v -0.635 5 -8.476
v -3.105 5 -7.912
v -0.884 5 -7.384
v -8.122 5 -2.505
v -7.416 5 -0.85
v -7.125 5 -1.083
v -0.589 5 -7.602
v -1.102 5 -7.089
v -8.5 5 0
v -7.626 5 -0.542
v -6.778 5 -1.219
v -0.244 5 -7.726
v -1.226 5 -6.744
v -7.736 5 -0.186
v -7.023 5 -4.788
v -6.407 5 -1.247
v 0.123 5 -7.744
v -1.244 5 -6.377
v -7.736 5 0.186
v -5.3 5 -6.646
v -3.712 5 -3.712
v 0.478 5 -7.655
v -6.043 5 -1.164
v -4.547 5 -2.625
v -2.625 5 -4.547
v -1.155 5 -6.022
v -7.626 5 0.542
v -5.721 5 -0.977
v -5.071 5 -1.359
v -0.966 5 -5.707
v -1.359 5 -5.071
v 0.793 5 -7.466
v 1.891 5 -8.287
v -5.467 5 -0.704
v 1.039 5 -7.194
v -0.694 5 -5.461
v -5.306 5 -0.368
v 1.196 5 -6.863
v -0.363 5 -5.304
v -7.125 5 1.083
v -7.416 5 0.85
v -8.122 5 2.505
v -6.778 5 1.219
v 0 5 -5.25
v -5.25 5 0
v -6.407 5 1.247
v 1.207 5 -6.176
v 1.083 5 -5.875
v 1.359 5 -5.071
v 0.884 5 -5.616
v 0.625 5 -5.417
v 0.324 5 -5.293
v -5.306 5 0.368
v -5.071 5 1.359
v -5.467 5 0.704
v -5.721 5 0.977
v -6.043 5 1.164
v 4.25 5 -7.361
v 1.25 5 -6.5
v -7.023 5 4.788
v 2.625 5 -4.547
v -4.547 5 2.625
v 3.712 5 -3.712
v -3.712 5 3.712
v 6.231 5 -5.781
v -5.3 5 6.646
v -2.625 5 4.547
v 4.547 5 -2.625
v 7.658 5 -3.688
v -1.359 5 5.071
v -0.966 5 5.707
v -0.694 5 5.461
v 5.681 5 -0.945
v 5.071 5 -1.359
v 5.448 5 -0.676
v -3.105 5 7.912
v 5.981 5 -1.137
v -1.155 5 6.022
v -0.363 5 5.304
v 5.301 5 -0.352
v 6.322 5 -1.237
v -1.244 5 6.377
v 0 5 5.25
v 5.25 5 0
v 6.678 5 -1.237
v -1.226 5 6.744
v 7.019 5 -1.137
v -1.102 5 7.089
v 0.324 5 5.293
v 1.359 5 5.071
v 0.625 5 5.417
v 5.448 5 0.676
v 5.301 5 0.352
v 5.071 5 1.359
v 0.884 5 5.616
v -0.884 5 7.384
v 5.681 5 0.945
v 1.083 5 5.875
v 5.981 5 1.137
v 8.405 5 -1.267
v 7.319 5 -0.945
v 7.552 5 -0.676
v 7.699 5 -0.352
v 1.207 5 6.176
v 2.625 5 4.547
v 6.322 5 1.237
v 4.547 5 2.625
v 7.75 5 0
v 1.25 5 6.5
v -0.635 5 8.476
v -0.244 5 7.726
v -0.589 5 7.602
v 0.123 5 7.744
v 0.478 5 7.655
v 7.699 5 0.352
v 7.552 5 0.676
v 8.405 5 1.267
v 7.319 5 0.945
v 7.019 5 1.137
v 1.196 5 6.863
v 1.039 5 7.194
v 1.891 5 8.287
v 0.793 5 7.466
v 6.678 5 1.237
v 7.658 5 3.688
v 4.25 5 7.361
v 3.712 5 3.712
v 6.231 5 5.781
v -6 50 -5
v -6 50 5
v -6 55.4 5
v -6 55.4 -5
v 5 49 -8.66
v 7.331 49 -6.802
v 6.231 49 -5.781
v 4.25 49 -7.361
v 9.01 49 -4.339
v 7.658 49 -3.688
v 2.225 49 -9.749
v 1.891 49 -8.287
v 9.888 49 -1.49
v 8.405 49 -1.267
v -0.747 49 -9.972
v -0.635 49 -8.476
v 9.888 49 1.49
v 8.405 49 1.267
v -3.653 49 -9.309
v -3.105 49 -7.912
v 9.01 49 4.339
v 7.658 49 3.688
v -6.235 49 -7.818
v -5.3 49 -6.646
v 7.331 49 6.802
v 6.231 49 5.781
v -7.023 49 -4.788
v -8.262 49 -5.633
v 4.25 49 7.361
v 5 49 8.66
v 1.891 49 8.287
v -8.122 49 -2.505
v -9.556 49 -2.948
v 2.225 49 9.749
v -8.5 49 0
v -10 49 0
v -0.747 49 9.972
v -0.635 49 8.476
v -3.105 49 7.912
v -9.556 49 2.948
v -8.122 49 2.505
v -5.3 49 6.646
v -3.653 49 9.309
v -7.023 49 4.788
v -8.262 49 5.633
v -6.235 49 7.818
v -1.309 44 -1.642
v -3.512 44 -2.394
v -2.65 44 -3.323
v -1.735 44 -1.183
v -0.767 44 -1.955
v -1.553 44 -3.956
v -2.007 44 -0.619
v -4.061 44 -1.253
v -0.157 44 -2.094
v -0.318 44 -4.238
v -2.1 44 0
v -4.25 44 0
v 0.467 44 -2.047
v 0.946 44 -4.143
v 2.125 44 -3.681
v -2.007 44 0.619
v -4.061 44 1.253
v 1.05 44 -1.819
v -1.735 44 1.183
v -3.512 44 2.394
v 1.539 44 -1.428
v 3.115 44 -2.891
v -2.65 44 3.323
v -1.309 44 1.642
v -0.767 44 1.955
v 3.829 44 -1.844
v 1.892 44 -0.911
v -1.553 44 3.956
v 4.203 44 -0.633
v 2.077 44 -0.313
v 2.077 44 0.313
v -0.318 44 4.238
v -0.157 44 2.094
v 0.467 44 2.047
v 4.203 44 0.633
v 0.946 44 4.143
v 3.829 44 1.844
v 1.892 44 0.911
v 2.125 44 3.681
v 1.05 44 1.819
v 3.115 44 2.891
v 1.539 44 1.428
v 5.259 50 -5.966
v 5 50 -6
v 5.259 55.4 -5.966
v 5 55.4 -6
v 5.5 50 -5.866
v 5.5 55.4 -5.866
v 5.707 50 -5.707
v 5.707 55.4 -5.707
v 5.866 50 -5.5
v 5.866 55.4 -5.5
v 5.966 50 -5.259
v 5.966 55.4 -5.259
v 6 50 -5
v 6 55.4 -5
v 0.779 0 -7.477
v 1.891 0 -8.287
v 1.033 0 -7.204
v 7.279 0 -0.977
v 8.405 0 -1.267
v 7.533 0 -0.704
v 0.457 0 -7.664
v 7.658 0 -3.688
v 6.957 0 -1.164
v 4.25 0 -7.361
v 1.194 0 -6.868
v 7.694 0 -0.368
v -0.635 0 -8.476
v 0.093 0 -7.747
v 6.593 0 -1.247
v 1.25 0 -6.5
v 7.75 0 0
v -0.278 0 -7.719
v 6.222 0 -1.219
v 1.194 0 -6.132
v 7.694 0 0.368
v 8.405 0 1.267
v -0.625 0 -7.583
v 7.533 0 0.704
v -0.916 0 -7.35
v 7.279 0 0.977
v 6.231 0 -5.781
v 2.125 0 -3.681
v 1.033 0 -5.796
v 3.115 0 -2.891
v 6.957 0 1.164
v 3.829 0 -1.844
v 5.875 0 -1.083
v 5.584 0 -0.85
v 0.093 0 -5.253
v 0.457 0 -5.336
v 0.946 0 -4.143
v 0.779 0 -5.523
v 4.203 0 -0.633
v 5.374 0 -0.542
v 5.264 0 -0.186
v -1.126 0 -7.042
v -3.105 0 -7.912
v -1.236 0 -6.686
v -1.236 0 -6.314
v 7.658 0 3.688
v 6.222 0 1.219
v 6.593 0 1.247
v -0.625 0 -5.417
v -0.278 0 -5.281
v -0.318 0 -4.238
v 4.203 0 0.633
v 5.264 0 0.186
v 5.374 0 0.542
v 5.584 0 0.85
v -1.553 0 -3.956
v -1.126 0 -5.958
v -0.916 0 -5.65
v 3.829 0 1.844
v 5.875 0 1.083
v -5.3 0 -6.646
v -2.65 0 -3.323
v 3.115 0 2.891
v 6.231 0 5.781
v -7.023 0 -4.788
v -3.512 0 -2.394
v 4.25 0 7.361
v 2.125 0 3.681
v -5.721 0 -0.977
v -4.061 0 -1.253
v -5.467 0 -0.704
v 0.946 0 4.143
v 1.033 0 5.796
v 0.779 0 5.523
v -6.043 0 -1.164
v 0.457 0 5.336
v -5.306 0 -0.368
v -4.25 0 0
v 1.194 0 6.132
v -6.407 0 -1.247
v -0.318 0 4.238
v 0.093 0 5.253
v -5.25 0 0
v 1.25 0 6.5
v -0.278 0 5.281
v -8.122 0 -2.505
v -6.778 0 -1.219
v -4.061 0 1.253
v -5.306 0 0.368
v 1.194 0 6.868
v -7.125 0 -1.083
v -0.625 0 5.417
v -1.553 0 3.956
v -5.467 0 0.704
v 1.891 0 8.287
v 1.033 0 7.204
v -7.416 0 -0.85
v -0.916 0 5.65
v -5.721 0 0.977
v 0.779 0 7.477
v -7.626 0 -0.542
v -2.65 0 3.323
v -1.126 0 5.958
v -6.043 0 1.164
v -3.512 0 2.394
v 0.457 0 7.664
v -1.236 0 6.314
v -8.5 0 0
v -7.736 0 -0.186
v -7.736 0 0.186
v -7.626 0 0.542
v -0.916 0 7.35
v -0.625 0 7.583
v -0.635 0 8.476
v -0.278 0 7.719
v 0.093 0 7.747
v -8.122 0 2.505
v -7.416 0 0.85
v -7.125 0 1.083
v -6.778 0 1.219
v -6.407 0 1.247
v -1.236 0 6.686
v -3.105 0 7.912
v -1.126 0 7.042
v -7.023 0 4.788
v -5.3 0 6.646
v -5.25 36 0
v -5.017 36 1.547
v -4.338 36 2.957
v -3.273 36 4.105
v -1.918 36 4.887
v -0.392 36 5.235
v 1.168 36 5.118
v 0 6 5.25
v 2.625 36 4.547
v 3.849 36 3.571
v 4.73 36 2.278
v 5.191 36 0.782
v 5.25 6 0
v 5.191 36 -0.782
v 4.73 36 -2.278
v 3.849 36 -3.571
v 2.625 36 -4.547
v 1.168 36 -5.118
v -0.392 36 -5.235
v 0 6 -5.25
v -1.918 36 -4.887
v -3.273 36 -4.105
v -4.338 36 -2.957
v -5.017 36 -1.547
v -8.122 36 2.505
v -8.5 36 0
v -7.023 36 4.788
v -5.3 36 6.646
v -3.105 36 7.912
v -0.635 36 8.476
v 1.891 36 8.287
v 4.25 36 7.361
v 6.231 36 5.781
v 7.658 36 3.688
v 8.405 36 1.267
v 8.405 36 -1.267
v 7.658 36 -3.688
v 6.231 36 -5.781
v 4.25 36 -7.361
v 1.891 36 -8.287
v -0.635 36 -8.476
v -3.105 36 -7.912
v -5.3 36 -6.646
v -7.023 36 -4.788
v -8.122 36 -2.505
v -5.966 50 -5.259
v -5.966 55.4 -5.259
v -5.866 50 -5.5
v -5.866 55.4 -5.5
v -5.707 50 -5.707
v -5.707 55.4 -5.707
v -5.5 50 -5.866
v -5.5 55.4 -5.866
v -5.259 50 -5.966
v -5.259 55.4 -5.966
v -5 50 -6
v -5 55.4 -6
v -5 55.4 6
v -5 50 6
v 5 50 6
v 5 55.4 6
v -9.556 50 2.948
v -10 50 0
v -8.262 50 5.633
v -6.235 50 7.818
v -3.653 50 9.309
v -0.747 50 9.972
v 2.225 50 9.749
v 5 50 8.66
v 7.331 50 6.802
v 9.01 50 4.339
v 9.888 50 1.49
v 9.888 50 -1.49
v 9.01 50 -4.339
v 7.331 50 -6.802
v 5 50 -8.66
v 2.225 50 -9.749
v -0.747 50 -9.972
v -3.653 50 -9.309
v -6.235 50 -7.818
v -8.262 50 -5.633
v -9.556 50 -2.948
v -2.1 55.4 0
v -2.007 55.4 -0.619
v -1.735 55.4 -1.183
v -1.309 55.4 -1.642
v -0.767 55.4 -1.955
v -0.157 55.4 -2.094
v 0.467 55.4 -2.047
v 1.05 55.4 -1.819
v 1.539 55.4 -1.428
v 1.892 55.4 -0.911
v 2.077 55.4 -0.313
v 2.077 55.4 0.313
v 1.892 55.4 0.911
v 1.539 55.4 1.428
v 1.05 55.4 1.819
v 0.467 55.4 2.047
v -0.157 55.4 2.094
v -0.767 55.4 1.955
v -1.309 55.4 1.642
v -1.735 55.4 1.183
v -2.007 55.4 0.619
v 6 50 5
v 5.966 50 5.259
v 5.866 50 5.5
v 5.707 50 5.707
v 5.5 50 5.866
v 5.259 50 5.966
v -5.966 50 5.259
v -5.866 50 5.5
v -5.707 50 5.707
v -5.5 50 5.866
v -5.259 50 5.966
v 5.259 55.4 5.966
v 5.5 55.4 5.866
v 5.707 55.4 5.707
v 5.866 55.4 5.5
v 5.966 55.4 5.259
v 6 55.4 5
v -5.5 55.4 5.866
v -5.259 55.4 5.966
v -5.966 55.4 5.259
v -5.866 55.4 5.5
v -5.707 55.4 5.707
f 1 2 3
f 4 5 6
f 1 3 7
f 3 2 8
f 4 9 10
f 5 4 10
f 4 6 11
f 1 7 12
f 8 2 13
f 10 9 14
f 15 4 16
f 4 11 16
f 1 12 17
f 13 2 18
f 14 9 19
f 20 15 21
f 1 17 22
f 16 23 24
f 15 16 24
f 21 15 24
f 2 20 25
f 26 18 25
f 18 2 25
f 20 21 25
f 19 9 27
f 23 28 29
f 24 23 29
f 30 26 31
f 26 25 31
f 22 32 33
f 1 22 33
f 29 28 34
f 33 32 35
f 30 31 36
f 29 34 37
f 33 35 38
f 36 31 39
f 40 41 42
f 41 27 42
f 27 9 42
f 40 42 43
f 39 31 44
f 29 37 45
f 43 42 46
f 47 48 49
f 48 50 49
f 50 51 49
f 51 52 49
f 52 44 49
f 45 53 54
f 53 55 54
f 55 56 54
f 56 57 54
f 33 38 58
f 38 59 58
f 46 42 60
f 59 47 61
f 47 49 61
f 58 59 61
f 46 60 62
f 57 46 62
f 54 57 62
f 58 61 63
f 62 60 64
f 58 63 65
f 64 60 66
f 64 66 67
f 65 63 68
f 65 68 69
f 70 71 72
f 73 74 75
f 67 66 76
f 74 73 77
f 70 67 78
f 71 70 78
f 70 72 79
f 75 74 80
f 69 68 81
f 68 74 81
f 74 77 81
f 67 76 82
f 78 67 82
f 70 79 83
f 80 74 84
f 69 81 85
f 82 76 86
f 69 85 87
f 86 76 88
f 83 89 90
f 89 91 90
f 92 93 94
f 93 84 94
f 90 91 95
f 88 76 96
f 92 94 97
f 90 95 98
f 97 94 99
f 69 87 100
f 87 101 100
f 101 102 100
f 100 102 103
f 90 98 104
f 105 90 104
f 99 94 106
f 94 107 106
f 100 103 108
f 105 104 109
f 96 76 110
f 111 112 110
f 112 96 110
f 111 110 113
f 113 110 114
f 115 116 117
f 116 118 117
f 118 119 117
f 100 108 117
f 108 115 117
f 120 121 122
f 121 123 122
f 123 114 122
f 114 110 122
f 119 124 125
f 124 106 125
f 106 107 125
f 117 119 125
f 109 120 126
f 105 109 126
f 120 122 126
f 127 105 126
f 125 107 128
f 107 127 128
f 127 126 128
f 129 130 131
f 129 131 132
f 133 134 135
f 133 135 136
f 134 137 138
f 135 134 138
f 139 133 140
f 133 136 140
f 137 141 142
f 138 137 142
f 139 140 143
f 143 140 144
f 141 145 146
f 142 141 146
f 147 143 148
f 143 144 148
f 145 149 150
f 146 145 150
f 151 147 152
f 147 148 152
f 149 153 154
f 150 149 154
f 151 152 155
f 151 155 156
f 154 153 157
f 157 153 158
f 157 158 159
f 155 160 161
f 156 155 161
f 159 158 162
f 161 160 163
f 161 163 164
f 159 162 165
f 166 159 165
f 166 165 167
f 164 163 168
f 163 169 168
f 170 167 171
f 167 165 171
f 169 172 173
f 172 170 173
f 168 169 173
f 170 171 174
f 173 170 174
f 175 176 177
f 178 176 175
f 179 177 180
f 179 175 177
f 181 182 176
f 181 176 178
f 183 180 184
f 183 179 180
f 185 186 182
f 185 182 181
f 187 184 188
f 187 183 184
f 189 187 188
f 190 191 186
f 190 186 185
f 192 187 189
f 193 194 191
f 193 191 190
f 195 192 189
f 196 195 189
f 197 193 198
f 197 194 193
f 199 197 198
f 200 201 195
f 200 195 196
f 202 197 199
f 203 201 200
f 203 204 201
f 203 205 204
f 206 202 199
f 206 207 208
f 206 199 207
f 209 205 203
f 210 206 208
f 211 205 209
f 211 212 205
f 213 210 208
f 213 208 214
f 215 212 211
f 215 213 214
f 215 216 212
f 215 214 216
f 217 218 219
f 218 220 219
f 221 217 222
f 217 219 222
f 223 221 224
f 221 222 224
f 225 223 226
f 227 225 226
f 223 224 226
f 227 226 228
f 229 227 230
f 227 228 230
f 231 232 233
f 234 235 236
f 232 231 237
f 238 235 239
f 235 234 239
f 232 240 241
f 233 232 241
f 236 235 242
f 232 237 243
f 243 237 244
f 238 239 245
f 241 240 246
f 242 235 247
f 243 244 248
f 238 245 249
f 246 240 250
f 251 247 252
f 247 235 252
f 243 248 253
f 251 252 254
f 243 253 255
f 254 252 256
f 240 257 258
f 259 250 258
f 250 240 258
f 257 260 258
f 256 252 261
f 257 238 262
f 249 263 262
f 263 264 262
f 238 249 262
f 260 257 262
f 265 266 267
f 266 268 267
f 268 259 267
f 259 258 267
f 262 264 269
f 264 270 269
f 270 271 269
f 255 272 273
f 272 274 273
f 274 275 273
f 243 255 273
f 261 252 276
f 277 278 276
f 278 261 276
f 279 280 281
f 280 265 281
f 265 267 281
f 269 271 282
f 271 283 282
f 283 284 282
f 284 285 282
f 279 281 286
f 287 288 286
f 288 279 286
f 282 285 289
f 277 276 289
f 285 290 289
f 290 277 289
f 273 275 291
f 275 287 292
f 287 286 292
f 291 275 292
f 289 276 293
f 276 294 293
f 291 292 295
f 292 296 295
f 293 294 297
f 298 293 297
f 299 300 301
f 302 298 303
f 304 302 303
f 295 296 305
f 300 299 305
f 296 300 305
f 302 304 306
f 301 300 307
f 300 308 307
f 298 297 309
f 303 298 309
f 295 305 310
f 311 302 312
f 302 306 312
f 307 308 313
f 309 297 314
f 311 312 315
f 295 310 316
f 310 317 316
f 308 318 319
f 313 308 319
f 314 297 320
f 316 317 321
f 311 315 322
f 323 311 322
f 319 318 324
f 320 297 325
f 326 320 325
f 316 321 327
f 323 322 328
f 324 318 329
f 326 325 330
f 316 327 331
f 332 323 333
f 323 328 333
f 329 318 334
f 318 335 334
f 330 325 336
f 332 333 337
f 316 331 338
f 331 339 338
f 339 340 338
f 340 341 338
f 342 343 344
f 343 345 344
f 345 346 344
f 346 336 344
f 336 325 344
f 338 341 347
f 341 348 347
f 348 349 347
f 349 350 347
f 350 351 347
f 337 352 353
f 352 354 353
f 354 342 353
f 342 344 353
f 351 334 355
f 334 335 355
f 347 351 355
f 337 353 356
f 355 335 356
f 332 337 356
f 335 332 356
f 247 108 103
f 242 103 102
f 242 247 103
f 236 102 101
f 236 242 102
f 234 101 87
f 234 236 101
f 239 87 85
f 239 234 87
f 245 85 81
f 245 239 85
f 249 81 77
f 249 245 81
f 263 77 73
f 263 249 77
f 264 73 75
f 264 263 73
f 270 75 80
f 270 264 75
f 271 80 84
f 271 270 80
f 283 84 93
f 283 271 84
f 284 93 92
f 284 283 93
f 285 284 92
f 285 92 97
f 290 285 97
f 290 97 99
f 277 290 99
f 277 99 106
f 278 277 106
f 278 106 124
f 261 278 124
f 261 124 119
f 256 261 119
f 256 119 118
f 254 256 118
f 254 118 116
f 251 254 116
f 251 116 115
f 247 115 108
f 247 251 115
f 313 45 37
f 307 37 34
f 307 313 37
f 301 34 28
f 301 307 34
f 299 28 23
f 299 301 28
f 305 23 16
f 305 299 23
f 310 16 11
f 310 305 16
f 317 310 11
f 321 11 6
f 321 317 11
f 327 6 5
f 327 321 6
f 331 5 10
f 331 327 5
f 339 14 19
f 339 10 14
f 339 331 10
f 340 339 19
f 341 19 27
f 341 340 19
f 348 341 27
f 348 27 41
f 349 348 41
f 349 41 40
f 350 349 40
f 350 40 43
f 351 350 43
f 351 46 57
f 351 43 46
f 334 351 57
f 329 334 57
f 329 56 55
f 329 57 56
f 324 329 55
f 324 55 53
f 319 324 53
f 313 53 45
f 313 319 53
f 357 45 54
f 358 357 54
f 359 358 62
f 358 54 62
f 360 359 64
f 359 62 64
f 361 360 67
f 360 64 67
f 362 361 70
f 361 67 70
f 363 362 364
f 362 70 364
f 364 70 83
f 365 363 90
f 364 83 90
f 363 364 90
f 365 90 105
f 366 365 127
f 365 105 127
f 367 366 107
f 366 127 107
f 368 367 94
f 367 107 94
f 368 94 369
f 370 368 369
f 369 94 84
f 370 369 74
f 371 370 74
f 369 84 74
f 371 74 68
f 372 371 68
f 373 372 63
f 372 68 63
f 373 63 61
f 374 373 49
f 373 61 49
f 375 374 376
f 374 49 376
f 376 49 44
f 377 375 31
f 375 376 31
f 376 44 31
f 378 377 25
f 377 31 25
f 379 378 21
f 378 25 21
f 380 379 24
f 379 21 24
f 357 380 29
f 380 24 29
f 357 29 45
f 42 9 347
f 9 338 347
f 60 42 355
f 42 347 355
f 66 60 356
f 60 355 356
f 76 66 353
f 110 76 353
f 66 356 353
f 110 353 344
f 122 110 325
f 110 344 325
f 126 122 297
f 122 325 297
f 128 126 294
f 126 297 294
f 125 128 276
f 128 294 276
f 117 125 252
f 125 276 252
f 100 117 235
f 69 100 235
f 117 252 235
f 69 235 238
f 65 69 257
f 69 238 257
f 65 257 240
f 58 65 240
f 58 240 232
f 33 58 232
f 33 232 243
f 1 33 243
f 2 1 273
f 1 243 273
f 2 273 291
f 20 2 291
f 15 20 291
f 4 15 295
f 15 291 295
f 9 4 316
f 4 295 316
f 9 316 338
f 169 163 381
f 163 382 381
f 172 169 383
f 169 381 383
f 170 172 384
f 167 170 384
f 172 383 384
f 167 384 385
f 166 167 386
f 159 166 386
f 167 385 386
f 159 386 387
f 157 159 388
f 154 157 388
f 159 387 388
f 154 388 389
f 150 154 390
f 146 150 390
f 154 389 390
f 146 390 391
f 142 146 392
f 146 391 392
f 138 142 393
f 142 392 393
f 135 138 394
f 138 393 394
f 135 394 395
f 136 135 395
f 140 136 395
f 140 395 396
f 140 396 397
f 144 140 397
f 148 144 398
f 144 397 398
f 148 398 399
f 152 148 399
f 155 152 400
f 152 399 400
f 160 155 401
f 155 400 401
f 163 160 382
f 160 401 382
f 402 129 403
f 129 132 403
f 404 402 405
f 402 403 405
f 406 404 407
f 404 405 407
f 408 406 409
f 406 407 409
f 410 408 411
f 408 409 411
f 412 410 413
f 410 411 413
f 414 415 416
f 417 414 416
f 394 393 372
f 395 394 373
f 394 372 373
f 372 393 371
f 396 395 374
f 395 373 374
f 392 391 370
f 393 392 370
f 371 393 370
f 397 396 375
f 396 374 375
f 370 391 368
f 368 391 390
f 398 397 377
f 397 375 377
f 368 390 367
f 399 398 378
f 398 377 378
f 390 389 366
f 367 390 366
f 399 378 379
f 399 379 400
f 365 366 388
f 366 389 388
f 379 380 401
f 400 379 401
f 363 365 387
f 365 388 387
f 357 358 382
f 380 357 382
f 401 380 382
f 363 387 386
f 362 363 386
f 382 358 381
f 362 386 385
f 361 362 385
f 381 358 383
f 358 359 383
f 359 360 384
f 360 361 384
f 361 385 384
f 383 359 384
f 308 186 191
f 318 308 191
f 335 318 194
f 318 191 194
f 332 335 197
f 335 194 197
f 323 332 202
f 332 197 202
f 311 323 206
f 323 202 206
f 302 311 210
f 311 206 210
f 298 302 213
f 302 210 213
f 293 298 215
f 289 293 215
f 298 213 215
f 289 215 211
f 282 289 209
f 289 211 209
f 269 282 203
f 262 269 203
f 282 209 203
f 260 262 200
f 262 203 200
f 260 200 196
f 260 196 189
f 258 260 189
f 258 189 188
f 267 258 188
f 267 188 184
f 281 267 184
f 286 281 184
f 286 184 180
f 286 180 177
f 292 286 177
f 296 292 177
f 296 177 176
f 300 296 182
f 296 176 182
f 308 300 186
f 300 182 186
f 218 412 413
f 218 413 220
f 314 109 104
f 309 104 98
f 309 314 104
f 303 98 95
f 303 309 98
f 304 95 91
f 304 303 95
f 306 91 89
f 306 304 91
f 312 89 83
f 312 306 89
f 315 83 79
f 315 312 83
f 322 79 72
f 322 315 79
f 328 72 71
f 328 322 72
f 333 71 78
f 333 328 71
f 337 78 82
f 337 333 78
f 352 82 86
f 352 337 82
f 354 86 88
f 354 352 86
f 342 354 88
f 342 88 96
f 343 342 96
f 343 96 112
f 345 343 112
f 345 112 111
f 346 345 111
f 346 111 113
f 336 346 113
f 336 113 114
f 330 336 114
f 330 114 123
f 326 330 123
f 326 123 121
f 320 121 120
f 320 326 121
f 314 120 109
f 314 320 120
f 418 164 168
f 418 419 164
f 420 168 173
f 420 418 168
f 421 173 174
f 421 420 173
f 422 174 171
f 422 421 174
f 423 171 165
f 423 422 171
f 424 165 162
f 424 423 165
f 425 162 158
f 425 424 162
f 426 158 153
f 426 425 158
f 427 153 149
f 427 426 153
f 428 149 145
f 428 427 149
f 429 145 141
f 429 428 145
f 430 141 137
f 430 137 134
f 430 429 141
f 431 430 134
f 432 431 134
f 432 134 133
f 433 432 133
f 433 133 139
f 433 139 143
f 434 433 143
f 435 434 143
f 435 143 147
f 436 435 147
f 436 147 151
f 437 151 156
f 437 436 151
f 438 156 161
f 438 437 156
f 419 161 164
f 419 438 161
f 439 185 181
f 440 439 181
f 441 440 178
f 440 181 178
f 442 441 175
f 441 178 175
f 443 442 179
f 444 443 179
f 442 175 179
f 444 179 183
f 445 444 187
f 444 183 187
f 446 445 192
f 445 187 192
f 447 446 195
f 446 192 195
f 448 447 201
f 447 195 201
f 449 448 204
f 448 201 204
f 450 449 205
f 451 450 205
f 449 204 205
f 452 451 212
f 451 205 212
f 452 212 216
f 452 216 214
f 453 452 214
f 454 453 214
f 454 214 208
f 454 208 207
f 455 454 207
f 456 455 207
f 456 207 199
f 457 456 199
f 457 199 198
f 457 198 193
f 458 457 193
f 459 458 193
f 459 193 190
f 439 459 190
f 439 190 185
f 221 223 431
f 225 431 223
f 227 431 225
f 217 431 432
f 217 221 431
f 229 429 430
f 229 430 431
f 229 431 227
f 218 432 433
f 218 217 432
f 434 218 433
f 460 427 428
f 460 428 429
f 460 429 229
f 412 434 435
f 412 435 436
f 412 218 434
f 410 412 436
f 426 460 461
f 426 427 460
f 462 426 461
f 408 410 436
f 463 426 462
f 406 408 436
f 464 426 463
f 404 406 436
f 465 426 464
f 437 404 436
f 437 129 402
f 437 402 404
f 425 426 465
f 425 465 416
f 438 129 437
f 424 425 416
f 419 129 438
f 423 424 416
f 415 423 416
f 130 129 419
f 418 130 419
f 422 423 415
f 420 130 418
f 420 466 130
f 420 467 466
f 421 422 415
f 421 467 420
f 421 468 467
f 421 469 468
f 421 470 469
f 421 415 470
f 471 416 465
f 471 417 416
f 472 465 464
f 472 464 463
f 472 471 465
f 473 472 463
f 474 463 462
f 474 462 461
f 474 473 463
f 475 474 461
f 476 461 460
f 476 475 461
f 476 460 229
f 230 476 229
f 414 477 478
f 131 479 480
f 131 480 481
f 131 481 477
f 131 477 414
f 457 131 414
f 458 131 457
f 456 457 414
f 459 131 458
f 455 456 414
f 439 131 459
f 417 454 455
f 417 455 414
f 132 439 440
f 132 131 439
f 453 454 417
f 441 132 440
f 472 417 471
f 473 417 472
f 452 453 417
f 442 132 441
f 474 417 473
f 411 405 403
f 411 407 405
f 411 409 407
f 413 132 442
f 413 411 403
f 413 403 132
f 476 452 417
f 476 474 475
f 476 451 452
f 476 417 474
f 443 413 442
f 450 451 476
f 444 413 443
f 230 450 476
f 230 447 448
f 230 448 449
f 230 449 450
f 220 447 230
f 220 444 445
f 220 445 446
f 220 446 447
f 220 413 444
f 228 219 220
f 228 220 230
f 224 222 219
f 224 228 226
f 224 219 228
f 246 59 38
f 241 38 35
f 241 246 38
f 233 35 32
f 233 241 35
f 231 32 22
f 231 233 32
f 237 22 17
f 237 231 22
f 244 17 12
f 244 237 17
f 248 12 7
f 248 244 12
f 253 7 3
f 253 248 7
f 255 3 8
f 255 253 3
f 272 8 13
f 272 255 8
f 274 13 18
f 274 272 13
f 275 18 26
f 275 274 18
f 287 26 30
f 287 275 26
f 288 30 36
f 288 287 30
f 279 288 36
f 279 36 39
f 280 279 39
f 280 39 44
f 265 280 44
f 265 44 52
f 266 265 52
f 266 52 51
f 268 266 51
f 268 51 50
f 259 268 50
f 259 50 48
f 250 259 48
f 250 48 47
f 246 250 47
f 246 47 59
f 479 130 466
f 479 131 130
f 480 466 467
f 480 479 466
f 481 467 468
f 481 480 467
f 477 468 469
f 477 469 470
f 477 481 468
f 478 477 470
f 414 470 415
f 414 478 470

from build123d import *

# Parameters (mm, degrees)
CUT_EXTRUDE_START   = -50
SKETCH_2_R          = 1.25
CUT_EXTRUDE_2_DEPTH = 6
SKETCH_4_W          = 12
SKETCH_4_H          = 12
EXTRUDE_1_DEPTH     = 5.4
FILLET_1_R          = 1
SKETCH_5_W          = 1.5
SKETCH_5_H          = 1
SKETCH_6_R          = 4.25
EXTRUDE_2_DEPTH     = 6
HOLE_WIZARD_M5_2_D  = 4.2


with BuildPart() as part:
    # 草图1 → 旋转1 (revolve)
    with BuildSketch(Plane.XY):
        Polygon((-8.5, 36), (-5.25, 36), (-5.25, 5), (-8.5, 5), (-8.5, 0), (-4.25, 0), (-4.25, 50), (-8.5, 50), align=None)
    revolve(axis=Axis((0, 0, 0), (0, 1, 0)))

    # 草图2 → 切除-拉伸2 (cut)
    with BuildSketch(Plane(origin=(0, 50, 0), x_dir=(1, 0, 0), z_dir=(0, 1, 0)).offset(CUT_EXTRUDE_START)):
        with Locations((0, 6.5)):
            Circle(SKETCH_2_R)
        with Locations((0, -6.5)):
            Circle(SKETCH_2_R)
        with Locations((-6.5, 0)):
            Circle(SKETCH_2_R)
        with Locations((6.5, 0)):
            Circle(SKETCH_2_R)
    extrude(amount=CUT_EXTRUDE_2_DEPTH, mode=Mode.SUBTRACT)

    # 草图4 → 凸台-拉伸1 (add)
    with BuildSketch(Plane(origin=(0, 50, 0), x_dir=(1, 0, 0), z_dir=(0, 1, 0))):
        Rectangle(SKETCH_4_W, SKETCH_4_H)
    extrude(amount=EXTRUDE_1_DEPTH)

    # 圆角1
    fillet_1_edges = [part.edges().sort_by_distance(p)[0] for p in [
        (6, 52.7, 6),
        (6, 52.7, -6),
        (-6, 52.7, -6),
        (-6, 52.7, 6),
    ]]
    fillet(fillet_1_edges, radius=FILLET_1_R)

    # 草图5 → 旋转2 (revolve)
    with BuildSketch(Plane.XY):
        with Locations((-9.25, 49.5)):
            Rectangle(SKETCH_5_W, SKETCH_5_H)
    revolve(axis=Axis((0, 0, 0), (0, 1, 0)))

    # 草图6 → 凸台-拉伸2 (add)
    with BuildSketch(Plane.XZ.offset(-50)):
        Circle(SKETCH_6_R)
    extrude(amount=EXTRUDE_2_DEPTH)

    # M5 螺纹孔2 (through all)
    with Locations(Plane(origin=(0, 55.4, 0), x_dir=(1, 0, 0), z_dir=(0, 1, 0))):
        with Locations((0, 0)):
            Hole(HOLE_WIZARD_M5_2_D / 2)


solid = part.part
